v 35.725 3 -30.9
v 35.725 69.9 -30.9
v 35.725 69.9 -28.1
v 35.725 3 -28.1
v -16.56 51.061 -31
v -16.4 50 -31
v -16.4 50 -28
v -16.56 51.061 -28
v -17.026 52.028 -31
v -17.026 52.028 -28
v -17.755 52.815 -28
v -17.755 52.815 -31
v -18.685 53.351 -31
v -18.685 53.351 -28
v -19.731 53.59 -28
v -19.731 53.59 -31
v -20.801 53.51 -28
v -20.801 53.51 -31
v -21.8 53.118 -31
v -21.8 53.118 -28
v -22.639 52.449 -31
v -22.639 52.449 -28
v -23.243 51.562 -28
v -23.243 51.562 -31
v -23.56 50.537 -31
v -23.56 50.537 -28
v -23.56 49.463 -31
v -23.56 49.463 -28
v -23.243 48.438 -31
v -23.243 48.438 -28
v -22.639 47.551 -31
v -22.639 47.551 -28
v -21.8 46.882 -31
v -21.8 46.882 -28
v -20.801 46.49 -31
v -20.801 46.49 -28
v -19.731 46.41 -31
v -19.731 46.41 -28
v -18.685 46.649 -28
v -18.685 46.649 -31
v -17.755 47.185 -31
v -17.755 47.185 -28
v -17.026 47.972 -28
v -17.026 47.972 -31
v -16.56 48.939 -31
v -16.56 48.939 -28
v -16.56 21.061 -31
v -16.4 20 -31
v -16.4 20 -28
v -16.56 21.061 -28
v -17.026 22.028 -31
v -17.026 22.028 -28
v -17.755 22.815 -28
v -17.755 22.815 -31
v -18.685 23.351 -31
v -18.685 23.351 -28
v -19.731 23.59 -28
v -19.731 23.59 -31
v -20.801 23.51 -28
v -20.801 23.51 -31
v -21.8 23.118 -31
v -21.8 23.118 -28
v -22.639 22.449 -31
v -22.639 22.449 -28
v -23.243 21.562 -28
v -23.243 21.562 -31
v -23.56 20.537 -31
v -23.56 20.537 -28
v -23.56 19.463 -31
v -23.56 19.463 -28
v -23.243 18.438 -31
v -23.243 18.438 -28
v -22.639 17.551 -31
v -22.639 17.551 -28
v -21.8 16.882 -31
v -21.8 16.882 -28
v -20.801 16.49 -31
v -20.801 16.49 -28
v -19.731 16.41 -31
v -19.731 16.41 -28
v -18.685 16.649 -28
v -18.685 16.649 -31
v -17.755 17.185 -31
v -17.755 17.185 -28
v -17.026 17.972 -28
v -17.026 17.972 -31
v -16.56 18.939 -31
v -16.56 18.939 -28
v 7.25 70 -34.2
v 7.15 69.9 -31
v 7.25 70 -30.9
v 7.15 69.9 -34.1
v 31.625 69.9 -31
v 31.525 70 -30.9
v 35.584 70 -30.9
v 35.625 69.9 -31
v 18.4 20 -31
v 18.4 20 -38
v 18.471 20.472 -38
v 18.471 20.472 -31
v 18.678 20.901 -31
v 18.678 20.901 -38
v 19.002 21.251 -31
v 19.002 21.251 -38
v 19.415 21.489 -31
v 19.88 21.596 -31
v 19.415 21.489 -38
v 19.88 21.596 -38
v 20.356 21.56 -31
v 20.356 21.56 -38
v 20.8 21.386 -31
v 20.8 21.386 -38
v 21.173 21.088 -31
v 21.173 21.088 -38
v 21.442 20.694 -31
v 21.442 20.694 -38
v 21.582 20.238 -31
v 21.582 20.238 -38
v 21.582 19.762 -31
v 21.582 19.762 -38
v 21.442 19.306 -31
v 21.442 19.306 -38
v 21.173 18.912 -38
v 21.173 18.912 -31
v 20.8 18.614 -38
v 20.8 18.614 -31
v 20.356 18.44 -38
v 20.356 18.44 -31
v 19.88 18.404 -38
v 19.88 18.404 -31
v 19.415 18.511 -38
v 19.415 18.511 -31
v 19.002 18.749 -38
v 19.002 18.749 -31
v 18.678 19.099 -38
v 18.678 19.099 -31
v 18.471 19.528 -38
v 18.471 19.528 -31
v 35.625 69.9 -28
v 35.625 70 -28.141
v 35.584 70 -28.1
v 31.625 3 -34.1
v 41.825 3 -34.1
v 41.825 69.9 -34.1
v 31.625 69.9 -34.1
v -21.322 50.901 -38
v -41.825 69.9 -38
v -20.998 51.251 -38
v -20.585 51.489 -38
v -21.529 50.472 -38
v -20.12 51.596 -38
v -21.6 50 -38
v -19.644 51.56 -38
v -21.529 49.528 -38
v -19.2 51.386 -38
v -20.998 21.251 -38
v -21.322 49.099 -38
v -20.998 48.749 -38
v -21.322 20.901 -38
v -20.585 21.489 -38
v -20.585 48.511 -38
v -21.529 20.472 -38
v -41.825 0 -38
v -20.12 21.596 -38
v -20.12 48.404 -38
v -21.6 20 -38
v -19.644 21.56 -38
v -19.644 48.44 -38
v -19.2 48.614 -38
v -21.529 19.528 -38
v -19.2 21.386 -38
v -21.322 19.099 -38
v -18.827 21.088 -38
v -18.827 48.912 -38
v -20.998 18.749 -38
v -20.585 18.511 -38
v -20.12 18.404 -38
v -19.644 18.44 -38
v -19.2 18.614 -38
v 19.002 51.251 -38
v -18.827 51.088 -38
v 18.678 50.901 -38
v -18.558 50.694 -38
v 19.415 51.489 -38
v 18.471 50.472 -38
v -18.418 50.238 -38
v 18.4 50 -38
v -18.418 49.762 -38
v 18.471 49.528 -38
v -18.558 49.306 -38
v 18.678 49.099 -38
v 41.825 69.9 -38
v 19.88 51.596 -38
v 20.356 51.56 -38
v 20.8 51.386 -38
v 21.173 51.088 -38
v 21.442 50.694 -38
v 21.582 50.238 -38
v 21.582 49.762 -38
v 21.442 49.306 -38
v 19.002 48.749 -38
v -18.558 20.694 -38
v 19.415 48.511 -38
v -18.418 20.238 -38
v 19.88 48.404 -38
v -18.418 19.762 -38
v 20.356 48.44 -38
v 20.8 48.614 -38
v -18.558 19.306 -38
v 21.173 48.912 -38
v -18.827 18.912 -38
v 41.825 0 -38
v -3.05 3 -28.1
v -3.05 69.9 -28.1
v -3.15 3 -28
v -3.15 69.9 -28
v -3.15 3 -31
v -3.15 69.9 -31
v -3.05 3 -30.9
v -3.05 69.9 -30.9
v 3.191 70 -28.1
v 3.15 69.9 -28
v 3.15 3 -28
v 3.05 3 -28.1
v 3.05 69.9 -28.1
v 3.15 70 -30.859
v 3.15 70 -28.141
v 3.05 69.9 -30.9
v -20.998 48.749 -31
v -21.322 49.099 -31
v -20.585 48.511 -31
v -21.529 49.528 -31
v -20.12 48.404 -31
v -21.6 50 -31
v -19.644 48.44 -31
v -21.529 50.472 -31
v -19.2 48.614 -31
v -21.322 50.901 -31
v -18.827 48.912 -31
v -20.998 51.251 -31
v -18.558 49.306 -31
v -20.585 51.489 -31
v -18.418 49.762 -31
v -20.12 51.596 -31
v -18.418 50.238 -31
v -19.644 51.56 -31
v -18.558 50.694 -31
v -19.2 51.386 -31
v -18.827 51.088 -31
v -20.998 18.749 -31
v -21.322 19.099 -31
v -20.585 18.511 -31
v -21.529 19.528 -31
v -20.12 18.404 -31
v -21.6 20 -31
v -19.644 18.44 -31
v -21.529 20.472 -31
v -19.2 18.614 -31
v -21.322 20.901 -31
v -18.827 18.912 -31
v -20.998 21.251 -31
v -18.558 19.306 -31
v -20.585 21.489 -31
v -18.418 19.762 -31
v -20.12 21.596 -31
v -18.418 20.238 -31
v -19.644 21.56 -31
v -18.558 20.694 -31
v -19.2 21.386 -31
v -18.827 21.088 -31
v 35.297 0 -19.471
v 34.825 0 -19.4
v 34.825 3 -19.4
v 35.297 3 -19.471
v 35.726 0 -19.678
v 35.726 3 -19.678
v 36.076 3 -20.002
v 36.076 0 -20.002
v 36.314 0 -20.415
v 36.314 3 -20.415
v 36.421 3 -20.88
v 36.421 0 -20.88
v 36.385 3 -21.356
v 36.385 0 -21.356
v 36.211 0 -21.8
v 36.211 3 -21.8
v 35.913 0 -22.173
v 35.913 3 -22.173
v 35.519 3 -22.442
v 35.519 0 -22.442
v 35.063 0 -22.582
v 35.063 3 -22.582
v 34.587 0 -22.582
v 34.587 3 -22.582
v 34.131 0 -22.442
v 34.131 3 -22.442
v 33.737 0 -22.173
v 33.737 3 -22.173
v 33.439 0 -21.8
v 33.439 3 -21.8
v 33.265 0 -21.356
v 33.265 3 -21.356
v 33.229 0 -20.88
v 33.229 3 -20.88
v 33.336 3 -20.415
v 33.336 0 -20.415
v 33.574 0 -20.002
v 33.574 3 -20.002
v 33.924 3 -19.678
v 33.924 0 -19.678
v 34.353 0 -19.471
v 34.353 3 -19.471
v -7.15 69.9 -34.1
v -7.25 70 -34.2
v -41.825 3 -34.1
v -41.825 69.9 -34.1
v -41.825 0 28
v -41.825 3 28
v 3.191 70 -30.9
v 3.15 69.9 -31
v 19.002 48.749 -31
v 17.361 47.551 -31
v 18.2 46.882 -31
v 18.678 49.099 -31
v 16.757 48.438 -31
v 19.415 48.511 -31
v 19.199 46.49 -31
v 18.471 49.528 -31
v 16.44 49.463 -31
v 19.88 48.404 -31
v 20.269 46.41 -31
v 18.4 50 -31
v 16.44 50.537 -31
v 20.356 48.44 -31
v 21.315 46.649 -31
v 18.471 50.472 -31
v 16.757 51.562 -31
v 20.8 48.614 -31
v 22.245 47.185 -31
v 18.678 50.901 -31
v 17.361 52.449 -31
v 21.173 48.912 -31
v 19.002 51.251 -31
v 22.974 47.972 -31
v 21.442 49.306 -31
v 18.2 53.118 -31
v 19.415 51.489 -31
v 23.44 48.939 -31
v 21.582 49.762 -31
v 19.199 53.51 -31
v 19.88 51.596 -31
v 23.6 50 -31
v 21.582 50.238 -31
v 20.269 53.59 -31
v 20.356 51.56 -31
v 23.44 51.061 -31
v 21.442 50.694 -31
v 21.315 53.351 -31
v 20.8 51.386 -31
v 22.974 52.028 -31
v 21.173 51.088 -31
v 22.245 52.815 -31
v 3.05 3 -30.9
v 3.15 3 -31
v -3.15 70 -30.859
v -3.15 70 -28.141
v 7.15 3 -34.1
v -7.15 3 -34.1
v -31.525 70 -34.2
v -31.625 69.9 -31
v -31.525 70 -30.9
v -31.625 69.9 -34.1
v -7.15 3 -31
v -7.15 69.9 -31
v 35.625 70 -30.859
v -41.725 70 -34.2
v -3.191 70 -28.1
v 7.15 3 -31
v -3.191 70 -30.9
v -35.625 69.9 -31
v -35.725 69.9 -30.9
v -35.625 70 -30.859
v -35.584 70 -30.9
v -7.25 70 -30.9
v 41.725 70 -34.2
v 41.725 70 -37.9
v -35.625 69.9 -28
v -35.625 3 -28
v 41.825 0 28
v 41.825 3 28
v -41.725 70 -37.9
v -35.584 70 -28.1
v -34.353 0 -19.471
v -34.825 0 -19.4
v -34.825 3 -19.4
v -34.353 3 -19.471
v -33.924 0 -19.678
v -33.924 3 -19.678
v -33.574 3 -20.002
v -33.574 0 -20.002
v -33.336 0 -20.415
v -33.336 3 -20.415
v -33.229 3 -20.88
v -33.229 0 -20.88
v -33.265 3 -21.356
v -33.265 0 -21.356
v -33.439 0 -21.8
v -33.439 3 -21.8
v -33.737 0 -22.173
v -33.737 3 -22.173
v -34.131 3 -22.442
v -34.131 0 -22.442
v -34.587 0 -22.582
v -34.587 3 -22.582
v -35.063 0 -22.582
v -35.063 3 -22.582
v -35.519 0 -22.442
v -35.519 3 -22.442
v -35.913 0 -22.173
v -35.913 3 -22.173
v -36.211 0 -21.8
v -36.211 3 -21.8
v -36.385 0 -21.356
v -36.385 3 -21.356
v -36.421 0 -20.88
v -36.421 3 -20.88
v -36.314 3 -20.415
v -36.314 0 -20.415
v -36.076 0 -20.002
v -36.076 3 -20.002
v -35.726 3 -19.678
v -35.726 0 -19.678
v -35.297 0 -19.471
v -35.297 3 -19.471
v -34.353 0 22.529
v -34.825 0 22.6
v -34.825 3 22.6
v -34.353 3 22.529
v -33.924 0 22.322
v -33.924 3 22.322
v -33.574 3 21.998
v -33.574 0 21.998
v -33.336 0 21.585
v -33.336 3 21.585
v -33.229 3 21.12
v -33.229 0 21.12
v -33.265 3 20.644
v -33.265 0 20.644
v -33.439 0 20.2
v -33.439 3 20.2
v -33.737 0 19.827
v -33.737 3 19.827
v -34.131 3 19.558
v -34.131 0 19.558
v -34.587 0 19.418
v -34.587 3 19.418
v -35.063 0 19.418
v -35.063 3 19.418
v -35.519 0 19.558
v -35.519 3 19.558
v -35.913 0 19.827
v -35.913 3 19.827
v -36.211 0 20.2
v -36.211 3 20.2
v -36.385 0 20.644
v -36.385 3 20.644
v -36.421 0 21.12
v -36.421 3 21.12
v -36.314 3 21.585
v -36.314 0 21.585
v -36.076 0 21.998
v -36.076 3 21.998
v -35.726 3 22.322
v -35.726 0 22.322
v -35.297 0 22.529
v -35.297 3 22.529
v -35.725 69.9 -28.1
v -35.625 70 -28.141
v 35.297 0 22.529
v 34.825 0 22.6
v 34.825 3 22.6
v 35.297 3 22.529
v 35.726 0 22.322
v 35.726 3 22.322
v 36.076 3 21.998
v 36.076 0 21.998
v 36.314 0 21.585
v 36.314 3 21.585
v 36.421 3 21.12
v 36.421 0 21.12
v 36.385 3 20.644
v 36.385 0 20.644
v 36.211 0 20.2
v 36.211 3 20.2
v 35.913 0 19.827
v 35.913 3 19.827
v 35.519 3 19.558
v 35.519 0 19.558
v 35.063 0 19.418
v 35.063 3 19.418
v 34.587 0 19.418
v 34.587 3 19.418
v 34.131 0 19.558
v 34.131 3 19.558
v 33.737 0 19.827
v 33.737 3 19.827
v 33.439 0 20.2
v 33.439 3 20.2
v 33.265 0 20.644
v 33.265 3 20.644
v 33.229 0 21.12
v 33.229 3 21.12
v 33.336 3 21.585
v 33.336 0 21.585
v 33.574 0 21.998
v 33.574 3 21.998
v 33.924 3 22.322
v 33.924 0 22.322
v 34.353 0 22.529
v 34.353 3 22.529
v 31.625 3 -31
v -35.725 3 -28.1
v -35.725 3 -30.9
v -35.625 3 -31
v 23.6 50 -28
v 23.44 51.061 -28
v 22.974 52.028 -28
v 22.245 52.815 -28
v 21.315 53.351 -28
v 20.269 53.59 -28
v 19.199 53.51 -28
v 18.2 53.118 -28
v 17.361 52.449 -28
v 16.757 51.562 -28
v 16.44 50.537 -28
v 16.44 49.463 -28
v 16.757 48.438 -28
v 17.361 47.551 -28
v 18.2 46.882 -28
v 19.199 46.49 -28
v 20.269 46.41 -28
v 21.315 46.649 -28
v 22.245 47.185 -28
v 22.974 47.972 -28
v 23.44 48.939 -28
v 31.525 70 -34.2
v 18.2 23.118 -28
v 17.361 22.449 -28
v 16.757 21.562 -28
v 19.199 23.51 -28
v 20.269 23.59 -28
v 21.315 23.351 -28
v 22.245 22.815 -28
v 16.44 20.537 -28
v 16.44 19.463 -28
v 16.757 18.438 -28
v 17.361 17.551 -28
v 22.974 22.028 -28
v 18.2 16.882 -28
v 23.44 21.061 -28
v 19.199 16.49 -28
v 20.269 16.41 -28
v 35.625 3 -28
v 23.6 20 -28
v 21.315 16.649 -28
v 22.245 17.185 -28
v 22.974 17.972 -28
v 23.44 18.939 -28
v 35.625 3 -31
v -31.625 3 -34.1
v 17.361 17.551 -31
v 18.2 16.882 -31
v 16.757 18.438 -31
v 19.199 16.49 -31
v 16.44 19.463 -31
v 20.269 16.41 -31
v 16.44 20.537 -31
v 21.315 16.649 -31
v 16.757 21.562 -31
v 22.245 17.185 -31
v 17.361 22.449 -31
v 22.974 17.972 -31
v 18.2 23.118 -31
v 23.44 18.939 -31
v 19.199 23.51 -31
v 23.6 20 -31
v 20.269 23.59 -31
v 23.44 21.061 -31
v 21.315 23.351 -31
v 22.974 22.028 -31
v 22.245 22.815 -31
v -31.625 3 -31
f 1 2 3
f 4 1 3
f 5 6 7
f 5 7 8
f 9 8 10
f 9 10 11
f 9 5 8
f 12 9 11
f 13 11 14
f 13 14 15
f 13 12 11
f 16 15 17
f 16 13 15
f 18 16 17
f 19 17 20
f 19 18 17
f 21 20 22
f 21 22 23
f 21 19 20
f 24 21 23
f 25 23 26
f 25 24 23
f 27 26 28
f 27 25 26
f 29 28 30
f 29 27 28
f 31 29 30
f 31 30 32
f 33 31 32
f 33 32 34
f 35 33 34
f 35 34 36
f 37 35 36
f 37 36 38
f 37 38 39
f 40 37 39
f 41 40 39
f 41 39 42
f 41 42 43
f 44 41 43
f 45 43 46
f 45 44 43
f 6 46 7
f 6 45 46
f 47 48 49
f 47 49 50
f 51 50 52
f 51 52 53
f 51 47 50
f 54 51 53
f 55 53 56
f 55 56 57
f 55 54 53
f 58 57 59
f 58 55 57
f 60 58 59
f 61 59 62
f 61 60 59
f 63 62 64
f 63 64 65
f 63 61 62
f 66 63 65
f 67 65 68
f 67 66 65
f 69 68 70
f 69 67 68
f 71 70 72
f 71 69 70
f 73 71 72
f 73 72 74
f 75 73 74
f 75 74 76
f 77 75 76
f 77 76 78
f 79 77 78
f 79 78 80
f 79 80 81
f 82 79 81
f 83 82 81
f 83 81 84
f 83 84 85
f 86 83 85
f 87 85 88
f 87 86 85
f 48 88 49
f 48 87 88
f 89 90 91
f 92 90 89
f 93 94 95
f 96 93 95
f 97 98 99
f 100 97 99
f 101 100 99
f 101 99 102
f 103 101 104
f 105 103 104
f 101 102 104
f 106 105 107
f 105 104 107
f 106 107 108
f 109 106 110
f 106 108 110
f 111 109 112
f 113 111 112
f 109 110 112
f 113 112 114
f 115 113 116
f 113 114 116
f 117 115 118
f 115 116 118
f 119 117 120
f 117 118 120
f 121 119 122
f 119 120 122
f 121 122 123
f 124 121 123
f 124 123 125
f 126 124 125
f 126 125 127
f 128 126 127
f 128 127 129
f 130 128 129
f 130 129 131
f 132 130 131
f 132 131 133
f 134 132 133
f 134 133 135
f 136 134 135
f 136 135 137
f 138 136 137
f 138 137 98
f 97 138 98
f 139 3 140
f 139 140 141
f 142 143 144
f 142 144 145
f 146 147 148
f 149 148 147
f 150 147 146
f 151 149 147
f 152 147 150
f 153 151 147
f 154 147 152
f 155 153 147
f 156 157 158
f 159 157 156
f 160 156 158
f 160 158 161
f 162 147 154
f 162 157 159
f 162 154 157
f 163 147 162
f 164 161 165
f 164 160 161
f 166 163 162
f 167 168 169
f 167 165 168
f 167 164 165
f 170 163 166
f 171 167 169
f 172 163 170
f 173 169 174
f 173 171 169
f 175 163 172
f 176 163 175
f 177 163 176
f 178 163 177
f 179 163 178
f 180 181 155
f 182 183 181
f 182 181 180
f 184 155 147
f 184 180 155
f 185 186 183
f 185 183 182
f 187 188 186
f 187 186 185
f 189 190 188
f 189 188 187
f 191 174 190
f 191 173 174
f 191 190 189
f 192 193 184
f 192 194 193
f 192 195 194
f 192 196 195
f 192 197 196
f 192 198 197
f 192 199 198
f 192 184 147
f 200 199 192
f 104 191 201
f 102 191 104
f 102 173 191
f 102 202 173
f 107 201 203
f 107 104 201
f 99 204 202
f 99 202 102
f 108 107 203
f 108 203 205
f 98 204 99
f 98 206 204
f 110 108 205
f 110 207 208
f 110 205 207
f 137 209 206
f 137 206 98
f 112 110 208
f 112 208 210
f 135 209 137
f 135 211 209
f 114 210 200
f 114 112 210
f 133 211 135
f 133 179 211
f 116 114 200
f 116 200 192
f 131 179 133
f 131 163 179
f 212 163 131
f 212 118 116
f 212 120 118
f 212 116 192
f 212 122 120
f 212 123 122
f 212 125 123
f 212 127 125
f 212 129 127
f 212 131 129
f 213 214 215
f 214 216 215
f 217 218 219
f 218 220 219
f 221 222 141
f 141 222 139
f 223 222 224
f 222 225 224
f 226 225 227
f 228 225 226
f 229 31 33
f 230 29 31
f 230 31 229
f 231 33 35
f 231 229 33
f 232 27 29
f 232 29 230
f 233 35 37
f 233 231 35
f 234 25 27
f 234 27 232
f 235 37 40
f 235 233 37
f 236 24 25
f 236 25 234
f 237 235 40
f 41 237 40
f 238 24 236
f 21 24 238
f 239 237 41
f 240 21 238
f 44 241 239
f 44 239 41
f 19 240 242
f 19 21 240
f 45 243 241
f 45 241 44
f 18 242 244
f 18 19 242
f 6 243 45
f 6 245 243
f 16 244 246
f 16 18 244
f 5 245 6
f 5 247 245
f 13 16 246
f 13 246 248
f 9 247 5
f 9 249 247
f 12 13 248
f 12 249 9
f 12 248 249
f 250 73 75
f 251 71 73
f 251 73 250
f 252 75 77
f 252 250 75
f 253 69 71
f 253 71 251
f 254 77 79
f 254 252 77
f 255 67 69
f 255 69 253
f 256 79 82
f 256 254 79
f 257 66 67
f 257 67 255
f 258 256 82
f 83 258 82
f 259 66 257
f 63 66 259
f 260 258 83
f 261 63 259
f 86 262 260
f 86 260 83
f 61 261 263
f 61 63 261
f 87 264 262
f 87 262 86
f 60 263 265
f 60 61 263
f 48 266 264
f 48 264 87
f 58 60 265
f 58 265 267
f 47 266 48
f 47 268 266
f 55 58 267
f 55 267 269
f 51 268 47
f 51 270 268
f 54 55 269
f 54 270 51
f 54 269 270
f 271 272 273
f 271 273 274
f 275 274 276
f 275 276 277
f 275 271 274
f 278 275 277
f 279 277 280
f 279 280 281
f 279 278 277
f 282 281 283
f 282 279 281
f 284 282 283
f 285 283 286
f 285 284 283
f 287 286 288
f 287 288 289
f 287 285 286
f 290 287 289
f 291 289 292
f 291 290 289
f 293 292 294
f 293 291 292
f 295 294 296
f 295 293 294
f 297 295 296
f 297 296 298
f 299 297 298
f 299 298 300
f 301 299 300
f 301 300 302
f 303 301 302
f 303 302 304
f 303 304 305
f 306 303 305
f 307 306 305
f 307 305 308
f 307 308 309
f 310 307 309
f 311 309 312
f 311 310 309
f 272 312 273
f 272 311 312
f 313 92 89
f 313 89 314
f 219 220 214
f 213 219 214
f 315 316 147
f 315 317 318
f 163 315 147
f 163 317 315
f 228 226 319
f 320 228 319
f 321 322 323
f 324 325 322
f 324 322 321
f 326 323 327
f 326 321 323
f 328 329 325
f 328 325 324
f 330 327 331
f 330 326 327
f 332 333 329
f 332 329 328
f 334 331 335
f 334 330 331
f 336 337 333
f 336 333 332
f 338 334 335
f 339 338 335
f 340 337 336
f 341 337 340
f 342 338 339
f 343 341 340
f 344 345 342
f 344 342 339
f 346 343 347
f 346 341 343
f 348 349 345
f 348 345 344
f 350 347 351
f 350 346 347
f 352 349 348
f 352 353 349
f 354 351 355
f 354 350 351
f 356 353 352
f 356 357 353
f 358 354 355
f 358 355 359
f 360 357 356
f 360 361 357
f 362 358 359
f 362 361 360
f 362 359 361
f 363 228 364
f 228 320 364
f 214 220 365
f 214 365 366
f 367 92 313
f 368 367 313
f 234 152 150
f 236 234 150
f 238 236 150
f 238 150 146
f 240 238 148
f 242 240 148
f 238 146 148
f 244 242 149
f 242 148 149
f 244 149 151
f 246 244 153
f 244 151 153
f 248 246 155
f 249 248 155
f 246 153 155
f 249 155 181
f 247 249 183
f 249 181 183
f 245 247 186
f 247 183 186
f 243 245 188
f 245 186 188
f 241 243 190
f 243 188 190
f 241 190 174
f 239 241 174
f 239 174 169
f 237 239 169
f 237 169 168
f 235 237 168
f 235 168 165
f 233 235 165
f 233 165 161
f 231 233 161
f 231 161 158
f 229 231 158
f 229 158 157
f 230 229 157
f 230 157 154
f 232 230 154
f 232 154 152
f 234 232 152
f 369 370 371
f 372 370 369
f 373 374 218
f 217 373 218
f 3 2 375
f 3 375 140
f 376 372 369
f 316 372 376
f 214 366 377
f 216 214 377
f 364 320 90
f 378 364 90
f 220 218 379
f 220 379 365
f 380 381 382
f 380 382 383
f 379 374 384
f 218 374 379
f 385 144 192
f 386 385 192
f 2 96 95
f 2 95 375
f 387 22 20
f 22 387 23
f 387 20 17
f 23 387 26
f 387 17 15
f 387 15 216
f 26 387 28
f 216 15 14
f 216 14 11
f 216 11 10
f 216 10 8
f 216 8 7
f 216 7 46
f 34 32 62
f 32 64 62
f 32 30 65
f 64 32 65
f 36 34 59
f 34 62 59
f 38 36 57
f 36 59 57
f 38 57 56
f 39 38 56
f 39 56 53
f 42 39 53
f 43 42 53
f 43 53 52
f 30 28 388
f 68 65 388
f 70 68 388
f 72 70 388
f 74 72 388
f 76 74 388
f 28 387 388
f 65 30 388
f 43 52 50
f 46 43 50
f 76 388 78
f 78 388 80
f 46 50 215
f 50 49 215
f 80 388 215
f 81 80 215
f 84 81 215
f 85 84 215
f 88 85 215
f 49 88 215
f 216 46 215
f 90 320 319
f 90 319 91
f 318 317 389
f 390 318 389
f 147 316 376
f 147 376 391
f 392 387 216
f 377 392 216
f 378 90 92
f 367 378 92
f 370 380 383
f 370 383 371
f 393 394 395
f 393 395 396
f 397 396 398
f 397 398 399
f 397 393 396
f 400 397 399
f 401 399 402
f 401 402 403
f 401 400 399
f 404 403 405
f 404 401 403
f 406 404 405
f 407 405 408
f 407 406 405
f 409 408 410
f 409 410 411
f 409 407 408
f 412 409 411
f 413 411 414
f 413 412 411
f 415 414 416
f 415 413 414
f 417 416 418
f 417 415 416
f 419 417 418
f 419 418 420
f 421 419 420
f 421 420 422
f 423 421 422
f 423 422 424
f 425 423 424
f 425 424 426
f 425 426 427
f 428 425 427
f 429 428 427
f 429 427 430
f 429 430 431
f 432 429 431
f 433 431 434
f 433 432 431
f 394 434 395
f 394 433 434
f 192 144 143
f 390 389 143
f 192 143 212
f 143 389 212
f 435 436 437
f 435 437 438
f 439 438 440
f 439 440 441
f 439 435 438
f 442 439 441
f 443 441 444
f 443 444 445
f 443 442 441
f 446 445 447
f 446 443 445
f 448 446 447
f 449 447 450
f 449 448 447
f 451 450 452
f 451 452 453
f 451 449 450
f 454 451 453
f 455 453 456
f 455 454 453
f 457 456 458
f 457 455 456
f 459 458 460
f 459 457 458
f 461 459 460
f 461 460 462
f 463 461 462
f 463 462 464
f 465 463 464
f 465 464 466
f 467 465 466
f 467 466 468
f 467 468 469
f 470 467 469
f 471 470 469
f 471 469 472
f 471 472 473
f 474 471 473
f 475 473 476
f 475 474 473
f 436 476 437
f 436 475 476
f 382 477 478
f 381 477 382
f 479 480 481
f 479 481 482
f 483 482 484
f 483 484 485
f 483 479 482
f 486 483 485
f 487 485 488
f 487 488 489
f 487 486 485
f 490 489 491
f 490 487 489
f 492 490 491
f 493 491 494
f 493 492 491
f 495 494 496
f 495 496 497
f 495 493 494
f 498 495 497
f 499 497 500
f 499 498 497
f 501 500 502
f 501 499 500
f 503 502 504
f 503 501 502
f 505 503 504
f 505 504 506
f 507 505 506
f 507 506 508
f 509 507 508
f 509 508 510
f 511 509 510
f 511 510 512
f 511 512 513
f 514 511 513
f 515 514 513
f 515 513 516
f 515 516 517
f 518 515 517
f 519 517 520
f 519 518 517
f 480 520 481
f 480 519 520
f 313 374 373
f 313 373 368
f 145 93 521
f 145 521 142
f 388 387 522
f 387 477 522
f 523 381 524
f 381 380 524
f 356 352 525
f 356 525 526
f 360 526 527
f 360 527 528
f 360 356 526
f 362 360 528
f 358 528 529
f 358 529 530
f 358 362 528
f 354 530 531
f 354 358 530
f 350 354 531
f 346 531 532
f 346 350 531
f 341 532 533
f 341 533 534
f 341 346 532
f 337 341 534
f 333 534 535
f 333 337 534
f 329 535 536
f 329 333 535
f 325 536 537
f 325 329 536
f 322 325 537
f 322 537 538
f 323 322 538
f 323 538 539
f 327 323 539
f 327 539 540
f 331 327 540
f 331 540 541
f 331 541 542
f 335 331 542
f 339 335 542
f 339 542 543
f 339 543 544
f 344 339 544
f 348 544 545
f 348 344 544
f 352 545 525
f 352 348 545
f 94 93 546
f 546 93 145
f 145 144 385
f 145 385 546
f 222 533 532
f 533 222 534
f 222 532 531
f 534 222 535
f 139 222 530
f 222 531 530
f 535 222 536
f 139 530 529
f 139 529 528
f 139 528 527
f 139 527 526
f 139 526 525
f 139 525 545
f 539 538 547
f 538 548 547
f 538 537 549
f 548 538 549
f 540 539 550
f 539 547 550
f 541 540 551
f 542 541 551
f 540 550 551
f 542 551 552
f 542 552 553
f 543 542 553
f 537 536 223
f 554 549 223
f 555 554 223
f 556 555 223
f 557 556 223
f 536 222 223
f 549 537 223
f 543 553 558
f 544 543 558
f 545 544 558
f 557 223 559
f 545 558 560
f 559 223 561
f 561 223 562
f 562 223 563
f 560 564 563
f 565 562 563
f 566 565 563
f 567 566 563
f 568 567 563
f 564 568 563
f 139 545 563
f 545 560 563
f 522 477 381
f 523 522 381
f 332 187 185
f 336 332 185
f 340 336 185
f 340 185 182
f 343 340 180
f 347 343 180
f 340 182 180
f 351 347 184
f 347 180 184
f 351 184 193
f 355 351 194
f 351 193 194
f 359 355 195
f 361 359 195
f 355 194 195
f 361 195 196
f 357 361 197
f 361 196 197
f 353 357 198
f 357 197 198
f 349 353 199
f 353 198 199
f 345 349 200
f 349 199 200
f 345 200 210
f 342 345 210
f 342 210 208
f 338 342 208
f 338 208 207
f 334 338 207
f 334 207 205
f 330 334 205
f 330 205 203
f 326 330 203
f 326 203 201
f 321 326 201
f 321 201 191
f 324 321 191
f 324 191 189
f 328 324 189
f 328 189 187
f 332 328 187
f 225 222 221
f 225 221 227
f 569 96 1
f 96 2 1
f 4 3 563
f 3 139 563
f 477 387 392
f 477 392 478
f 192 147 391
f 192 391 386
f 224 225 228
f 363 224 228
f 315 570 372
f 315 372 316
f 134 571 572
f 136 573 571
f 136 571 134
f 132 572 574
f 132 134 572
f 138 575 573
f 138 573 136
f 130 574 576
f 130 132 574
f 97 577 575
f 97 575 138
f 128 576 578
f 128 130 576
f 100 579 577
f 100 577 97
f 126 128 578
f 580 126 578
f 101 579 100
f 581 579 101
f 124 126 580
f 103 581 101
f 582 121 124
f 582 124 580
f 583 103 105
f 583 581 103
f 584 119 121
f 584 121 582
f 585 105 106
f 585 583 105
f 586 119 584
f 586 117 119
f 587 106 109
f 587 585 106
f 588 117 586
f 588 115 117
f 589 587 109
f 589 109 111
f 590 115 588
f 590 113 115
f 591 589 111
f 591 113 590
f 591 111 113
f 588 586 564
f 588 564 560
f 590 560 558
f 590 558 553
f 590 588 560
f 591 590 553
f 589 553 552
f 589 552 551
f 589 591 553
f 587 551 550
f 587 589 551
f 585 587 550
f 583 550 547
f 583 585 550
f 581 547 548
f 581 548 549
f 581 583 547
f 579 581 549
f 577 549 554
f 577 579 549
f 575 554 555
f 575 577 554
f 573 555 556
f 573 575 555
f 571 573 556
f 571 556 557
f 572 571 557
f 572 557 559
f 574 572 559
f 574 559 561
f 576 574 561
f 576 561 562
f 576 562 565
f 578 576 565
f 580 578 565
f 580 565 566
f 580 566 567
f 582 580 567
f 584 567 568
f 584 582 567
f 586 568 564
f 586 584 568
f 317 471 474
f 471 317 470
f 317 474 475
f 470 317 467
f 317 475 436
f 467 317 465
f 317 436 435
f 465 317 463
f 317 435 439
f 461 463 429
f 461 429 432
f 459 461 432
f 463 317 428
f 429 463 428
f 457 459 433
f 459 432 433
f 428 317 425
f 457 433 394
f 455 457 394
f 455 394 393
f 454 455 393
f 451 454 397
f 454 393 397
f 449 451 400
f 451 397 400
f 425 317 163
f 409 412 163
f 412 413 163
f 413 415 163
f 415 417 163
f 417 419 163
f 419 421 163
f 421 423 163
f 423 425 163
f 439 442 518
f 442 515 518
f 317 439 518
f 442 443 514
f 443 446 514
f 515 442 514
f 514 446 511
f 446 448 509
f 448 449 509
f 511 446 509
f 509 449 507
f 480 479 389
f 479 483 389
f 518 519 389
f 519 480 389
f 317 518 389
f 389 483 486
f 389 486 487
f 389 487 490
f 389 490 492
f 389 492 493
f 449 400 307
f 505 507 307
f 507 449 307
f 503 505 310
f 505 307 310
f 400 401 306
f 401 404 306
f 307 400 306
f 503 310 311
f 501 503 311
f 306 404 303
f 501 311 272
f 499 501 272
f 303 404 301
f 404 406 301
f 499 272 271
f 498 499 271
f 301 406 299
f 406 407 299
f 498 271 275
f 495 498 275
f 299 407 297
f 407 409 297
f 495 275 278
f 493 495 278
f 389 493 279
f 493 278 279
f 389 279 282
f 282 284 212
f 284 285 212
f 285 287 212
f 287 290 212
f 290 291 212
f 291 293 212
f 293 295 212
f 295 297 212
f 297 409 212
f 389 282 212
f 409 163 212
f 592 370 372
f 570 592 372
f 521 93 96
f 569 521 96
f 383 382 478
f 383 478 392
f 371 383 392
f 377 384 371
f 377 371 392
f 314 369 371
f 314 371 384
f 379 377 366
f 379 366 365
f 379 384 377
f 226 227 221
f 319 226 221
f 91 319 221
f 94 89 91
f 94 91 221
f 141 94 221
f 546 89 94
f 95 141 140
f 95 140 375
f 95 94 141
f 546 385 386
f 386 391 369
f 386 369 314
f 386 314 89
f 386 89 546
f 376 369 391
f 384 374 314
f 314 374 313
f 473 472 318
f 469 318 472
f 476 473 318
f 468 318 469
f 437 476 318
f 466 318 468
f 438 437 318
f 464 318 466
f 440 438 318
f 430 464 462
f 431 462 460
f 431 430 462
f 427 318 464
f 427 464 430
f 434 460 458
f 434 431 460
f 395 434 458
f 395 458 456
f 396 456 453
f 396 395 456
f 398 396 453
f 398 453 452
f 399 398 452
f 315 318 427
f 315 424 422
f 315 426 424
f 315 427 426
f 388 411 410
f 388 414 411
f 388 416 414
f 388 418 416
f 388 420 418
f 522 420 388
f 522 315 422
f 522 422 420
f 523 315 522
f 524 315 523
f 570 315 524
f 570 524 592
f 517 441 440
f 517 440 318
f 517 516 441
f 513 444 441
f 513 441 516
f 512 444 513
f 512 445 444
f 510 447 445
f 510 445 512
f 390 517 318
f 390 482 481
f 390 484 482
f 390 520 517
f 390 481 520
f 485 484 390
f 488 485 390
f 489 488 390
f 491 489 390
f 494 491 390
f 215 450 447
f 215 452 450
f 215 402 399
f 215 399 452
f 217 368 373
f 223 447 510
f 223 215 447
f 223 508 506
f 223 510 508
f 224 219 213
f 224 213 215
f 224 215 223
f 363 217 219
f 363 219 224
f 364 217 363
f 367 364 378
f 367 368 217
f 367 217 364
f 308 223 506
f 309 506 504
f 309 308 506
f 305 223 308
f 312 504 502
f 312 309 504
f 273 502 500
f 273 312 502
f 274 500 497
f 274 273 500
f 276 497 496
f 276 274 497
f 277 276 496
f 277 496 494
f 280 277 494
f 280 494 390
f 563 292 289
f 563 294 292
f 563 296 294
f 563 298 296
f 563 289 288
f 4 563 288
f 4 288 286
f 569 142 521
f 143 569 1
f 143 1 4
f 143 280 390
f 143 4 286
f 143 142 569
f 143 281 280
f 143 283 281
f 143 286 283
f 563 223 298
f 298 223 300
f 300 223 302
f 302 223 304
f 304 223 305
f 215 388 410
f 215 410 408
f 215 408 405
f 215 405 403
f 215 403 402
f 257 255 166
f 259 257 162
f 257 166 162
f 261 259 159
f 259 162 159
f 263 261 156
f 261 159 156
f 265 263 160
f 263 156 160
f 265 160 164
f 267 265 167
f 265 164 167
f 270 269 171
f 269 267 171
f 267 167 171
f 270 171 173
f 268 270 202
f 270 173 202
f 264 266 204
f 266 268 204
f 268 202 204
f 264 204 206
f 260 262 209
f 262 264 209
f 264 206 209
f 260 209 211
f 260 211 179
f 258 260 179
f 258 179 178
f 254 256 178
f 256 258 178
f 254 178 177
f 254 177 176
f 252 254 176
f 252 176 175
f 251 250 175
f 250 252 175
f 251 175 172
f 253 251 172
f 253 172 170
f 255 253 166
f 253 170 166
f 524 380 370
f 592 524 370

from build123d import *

# Parameters (mm, degrees)
SKETCH1_W           = 83.65
SKETCH1_H           = 56
SKETCH1_R           = 1.6
BOSS_EXTRUDE1_DEPTH = 3
SKETCH2_W           = 83.65
SKETCH2_H           = 10
BOSS_EXTRUDE2_DEPTH = 70
SKETCH3_W           = 4.1
SKETCH3_H           = 3.1
CUT_EXTRUDE1_DEPTH  = 67
CHAMFER1_SIZE       = 0.1
CHAMFER2_SIZE       = 0.1
SKETCH4_R           = 1.6
CUT_EXTRUDE2_DEPTH  = 10
CUT_EXTRUDE3_START  = -3
SKETCH5_R           = 3.6
SKETCH5_R_2         = 1.6
CUT_EXTRUDE3_DEPTH  = 3


with BuildPart() as part:
    # Sketch1 → Boss-Extrude1 (new body)
    with BuildSketch(Plane(origin=(0, 0, 0), x_dir=(1, 0, 0), z_dir=(0, 1, 0))):
        Rectangle(SKETCH1_W, SKETCH1_H)
        with Locations(Location((-34.825, -21, 0), (0, 0, 270))):
            Circle(SKETCH1_R, mode=Mode.SUBTRACT)
        with Locations(Location((34.825, -21, 0), (0, 0, 270))):
            Circle(SKETCH1_R, mode=Mode.SUBTRACT)
        with Locations(Location((34.825, 21, 0), (0, 0, 270))):
            Circle(SKETCH1_R, mode=Mode.SUBTRACT)
        with Locations(Location((-34.825, 21, 0), (0, 0, 270))):
            Circle(SKETCH1_R, mode=Mode.SUBTRACT)
    extrude(amount=BOSS_EXTRUDE1_DEPTH)

    # Sketch2 → Boss-Extrude2 (add)
    with BuildSketch(Plane(origin=(0, 0, 0), x_dir=(1, 0, 0), z_dir=(0, 1, 0))):
        with Locations((0, 33)):
            Rectangle(SKETCH2_W, SKETCH2_H)
    extrude(amount=BOSS_EXTRUDE2_DEPTH)

    # Sketch3 → Cut-Extrude1 (cut)
    with BuildSketch(Plane(origin=(0, 70, 0), x_dir=(1, 0, 0), z_dir=(0, 1, 0))):
        Polygon((-3.05, 31), (-3.05, 28), (3.05, 28), (3.05, 31), (3.05, 34.1), (-3.05, 34.1), align=None)
        with Locations((-5.1, 32.55)):
            Rectangle(SKETCH3_W, SKETCH3_H)
        with Locations((5.1, 32.55)):
            Rectangle(SKETCH3_W, SKETCH3_H)
        with Locations((33.675, 32.55)):
            Rectangle(SKETCH3_W, SKETCH3_H)
        Polygon((35.725, 31), (35.725, 28), (41.825, 28), (41.825, 34.1), (35.725, 34.1), align=None)
        with Locations((-33.675, 32.55)):
            Rectangle(SKETCH3_W, SKETCH3_H)
        Polygon((-35.725, 31), (-35.725, 34.1), (-41.825, 34.1), (-41.825, 28), (-35.725, 28), align=None)
    extrude(amount=-CUT_EXTRUDE1_DEPTH, mode=Mode.SUBTRACT)

    # Chamfer1
    chamfer1_edges = [part.edges().sort_by_distance(p)[0] for p in [
        (3.05, 36.5, -31),
        (3.05, 36.5, -28),
        (-3.05, 36.5, -28),
        (-3.05, 36.5, -31),
        (35.725, 36.5, -28),
        (35.725, 36.5, -31),
        (-35.725, 36.5, -28),
        (-35.725, 36.5, -31),
    ]]
    chamfer(chamfer1_edges, length=CHAMFER1_SIZE)

    # Chamfer2
    chamfer2_edges = [part.edges().sort_by_distance(p)[0] for p in [
        (-35.725, 70, -29.5),
        (19.3875, 70, -28),
        (35.725, 70, -29.5),
        (-19.3875, 70, -28),
        (-3.05, 70, -29.5),
        (-5.15, 70, -31),
        (5.15, 70, -31),
        (3.05, 70, -29.5),
        (-3.1, 70, -28.05),
        (-3.1, 70, -30.95),
        (35.675, 70, -28.05),
        (35.675, 70, -30.95),
        (3.1, 70, -28.05),
        (3.1, 70, -30.95),
        (-35.675, 70, -30.95),
        (-35.675, 70, -28.05),
        (-41.825, 70, -36.05),
        (0, 70, -38),
        (-7.15, 70, -32.55),
        (0, 70, -34.1),
        (7.15, 70, -32.55),
        (41.825, 70, -36.05),
        (33.625, 70, -31),
        (36.725, 70, -34.1),
        (31.625, 70, -32.55),
        (-31.625, 70, -32.55),
        (-36.725, 70, -34.1),
        (-33.625, 70, -31),
    ]]
    chamfer(chamfer2_edges, length=CHAMFER2_SIZE)

    # Sketch4 → Cut-Extrude2 (cut)
    with BuildSketch(Plane(origin=(0, 0, -38), x_dir=(-1, 0, 0), z_dir=(0, 0, -1))):
        with Locations((-20, 20)):
            Circle(SKETCH4_R)
        with Locations((-20, 50)):
            Circle(SKETCH4_R)
        with Locations((20, 20)):
            Circle(SKETCH4_R)
        with Locations((20, 50)):
            Circle(SKETCH4_R)
    extrude(amount=-CUT_EXTRUDE2_DEPTH, mode=Mode.SUBTRACT)

    # Sketch5 → Cut-Extrude3 (cut)
    # profile 1 of 4: a face of its own
    with BuildSketch(Plane.XY.offset(-28).offset(CUT_EXTRUDE3_START)):
        with Locations((-20, 20)):
            Circle(SKETCH5_R)
        with Locations((-20, 20)):
            Circle(SKETCH5_R_2, mode=Mode.SUBTRACT)
    # profile 2 of 4: a face of its own
    with BuildSketch(Plane.XY.offset(-28).offset(CUT_EXTRUDE3_START)):
        with Locations((20, 20)):
            Circle(SKETCH5_R)
    # profile 3 of 4: a face of its own
    with BuildSketch(Plane.XY.offset(-28).offset(CUT_EXTRUDE3_START)):
        with Locations((20, 50)):
            Circle(SKETCH5_R)
    # profile 4 of 4: a face of its own
    with BuildSketch(Plane.XY.offset(-28).offset(CUT_EXTRUDE3_START)):
        with Locations((-20, 50)):
            Circle(SKETCH5_R)
    extrude(amount=CUT_EXTRUDE3_DEPTH, mode=Mode.SUBTRACT)


solid = part.part
